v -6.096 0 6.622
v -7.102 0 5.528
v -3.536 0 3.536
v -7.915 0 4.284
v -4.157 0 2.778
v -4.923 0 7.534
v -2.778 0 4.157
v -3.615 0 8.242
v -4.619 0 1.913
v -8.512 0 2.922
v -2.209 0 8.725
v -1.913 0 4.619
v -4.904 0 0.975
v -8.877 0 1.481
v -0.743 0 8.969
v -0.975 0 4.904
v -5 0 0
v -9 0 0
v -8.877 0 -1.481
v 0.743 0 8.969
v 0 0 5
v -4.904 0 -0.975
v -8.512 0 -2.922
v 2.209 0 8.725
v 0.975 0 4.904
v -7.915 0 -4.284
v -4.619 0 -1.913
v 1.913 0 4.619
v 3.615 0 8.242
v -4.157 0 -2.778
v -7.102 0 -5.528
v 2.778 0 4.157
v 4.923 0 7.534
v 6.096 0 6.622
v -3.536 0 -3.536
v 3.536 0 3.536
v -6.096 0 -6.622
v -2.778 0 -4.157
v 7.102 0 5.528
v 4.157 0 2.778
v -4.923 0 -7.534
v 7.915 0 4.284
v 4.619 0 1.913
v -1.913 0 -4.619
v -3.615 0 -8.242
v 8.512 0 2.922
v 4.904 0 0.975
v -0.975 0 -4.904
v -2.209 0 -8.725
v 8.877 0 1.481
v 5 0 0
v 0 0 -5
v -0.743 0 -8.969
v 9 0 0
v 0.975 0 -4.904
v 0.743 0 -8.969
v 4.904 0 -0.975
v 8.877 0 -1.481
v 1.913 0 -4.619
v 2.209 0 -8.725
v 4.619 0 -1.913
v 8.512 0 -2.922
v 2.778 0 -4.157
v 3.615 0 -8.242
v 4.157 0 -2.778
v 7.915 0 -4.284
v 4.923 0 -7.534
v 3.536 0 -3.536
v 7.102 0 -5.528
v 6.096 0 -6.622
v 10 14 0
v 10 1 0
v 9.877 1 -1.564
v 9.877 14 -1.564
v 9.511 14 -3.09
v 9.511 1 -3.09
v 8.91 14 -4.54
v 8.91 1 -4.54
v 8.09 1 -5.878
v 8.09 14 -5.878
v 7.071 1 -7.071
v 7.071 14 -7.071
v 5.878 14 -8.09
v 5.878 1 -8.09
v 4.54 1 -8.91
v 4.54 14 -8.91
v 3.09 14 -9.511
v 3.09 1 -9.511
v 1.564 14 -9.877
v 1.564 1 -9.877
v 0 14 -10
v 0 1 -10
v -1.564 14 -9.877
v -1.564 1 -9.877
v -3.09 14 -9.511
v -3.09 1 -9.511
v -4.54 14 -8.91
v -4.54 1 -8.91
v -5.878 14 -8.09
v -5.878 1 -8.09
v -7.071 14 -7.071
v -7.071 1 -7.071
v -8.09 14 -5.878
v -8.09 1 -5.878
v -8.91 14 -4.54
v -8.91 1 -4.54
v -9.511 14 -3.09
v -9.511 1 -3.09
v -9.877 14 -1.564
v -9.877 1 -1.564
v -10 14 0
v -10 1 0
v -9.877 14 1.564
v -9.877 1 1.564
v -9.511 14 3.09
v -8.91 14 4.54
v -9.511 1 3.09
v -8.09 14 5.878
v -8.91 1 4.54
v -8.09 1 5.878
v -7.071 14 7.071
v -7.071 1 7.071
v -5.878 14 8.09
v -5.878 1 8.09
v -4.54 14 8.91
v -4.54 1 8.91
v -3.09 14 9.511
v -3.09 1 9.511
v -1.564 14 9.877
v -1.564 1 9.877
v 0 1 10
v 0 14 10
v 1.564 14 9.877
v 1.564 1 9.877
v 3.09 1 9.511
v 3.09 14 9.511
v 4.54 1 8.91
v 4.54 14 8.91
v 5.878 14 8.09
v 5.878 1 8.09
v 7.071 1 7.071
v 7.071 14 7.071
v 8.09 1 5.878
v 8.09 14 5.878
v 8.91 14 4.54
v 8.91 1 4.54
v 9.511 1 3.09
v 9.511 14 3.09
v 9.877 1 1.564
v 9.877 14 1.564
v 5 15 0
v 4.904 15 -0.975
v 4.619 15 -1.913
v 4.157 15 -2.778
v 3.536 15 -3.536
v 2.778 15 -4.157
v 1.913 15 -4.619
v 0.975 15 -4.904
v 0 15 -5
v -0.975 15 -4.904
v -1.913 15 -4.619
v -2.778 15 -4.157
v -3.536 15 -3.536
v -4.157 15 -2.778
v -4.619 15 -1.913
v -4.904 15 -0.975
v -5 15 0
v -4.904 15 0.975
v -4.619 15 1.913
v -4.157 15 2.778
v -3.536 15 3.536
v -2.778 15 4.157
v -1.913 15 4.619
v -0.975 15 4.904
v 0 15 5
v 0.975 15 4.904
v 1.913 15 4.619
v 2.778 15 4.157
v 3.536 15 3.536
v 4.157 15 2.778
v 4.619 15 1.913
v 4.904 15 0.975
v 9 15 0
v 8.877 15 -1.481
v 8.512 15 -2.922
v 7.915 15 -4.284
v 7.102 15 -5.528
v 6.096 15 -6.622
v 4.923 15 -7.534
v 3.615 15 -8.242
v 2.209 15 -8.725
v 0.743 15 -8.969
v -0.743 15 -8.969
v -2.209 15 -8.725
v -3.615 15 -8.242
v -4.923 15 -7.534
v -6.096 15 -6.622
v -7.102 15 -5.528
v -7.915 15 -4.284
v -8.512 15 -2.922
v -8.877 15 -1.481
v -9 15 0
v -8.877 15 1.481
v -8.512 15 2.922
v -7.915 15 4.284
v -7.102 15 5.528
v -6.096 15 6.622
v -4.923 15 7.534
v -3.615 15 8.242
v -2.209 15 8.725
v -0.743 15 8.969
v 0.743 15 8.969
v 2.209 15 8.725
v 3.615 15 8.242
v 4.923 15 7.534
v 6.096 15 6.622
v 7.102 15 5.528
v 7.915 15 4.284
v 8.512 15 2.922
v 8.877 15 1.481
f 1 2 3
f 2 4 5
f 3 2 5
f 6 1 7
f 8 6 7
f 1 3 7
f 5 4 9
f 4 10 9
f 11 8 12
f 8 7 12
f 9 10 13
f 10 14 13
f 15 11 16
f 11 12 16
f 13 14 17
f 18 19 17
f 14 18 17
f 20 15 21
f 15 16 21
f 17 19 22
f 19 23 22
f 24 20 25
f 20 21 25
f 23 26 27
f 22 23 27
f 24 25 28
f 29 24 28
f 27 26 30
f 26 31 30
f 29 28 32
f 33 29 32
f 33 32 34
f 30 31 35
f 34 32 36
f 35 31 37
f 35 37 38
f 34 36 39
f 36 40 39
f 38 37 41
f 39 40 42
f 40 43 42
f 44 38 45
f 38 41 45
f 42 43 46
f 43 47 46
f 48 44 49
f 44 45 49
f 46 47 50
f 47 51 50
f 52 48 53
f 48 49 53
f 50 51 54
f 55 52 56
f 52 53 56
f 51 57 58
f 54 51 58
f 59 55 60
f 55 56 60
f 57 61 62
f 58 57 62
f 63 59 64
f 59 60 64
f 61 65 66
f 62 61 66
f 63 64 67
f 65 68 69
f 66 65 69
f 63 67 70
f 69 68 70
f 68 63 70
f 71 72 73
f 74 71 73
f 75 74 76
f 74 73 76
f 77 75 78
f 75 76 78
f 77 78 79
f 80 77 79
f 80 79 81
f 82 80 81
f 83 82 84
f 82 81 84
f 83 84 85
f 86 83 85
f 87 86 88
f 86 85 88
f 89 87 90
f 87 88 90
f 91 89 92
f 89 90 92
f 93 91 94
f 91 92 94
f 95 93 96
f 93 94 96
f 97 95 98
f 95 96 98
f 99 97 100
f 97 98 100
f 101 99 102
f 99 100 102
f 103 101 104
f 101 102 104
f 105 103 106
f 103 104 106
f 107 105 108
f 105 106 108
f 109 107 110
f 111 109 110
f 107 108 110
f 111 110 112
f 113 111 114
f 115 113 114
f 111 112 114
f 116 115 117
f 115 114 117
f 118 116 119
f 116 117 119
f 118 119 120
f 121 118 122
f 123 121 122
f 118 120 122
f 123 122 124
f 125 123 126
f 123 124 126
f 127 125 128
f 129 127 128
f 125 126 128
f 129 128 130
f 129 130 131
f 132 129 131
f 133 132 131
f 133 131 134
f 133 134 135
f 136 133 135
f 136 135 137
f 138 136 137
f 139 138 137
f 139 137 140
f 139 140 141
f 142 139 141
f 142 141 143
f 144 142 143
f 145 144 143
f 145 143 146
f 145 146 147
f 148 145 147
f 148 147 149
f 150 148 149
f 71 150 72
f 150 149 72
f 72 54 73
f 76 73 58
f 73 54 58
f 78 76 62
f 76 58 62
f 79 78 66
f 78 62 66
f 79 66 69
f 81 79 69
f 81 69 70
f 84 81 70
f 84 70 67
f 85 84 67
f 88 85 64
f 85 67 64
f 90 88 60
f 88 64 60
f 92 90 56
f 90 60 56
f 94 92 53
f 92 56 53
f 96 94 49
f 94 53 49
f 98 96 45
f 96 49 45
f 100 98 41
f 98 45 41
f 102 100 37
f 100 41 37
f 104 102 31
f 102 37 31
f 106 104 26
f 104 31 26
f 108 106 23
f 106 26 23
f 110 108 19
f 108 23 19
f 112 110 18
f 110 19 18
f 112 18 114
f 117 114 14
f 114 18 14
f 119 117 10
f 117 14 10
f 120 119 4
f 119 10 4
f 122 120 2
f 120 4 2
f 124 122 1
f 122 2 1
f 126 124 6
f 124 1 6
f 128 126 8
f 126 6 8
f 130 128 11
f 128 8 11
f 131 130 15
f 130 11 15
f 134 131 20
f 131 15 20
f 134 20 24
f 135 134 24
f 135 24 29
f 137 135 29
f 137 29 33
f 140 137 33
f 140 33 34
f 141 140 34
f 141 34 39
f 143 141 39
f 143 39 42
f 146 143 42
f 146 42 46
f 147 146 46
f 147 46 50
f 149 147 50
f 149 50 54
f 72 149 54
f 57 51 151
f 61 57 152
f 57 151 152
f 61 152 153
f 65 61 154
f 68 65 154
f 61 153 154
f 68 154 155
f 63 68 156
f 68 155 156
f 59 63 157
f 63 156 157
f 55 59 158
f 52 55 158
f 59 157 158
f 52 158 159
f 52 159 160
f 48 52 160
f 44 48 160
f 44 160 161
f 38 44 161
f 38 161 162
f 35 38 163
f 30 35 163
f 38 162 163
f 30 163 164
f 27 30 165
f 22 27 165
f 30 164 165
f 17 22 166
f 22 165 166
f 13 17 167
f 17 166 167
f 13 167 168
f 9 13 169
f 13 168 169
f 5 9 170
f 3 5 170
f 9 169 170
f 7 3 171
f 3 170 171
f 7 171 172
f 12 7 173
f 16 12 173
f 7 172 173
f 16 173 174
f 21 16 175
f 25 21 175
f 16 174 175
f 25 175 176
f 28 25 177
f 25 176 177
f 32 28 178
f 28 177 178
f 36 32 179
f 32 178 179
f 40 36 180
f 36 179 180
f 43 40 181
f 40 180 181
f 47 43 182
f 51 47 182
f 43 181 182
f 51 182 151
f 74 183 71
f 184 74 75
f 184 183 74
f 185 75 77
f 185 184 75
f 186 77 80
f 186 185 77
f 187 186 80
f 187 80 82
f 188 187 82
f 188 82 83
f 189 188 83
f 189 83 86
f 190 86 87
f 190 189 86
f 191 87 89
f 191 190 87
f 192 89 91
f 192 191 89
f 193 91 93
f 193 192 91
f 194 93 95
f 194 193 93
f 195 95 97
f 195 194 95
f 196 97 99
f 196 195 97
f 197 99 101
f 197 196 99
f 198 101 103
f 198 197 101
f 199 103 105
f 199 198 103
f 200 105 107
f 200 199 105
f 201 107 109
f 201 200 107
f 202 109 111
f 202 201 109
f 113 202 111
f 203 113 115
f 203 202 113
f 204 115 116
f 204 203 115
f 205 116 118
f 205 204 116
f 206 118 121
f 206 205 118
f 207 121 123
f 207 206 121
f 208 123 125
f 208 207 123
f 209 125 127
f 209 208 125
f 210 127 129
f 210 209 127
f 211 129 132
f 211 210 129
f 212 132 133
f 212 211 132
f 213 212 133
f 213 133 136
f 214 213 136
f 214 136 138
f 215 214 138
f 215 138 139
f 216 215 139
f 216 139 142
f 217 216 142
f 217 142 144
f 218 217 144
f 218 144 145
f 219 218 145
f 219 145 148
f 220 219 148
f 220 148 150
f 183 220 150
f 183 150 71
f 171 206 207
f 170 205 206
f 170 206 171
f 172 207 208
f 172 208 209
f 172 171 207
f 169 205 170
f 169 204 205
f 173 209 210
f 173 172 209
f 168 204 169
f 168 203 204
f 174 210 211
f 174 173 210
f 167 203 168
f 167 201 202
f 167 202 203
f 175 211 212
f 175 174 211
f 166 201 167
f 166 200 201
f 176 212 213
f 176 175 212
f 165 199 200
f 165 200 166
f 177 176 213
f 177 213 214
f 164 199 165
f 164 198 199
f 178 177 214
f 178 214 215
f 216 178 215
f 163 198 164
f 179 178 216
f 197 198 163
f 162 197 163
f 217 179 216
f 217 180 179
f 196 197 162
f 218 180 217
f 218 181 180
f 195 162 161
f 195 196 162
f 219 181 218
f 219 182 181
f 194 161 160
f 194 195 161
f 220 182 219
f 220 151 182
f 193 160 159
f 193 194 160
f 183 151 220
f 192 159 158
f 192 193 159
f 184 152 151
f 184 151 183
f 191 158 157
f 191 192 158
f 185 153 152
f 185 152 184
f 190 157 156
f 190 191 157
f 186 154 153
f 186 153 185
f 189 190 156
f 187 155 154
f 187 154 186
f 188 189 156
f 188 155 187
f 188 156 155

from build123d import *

# Parameters (mm, degrees)
SKETCH1_R           = 10
BOSS_EXTRUDE1_DEPTH = 15
SKETCH2_R           = 5
CUT_EXTRUDE1_DEPTH  = 15
CHAMFER1_SIZE       = 1


with BuildPart() as part:
    # Sketch1 → Boss-Extrude1 (new body)
    with BuildSketch(Plane(origin=(0, 0, 0), x_dir=(1, 0, 0), z_dir=(0, 1, 0))):
        Circle(SKETCH1_R)
    extrude(amount=BOSS_EXTRUDE1_DEPTH)

    # Sketch2 → Cut-Extrude1 (cut)
    with BuildSketch(Plane(origin=(0, 15, 0), x_dir=(1, 0, 0), z_dir=(0, 1, 0))):
        Circle(SKETCH2_R)
    extrude(amount=-CUT_EXTRUDE1_DEPTH, mode=Mode.SUBTRACT)

    # Chamfer1
    chamfer1_edges = [part.edges().sort_by_distance(p)[0] for p in [
        (-10, 0, 0),
        (-10, 15, 0),
    ]]
    chamfer(chamfer1_edges, length=CHAMFER1_SIZE)


solid = part.part
